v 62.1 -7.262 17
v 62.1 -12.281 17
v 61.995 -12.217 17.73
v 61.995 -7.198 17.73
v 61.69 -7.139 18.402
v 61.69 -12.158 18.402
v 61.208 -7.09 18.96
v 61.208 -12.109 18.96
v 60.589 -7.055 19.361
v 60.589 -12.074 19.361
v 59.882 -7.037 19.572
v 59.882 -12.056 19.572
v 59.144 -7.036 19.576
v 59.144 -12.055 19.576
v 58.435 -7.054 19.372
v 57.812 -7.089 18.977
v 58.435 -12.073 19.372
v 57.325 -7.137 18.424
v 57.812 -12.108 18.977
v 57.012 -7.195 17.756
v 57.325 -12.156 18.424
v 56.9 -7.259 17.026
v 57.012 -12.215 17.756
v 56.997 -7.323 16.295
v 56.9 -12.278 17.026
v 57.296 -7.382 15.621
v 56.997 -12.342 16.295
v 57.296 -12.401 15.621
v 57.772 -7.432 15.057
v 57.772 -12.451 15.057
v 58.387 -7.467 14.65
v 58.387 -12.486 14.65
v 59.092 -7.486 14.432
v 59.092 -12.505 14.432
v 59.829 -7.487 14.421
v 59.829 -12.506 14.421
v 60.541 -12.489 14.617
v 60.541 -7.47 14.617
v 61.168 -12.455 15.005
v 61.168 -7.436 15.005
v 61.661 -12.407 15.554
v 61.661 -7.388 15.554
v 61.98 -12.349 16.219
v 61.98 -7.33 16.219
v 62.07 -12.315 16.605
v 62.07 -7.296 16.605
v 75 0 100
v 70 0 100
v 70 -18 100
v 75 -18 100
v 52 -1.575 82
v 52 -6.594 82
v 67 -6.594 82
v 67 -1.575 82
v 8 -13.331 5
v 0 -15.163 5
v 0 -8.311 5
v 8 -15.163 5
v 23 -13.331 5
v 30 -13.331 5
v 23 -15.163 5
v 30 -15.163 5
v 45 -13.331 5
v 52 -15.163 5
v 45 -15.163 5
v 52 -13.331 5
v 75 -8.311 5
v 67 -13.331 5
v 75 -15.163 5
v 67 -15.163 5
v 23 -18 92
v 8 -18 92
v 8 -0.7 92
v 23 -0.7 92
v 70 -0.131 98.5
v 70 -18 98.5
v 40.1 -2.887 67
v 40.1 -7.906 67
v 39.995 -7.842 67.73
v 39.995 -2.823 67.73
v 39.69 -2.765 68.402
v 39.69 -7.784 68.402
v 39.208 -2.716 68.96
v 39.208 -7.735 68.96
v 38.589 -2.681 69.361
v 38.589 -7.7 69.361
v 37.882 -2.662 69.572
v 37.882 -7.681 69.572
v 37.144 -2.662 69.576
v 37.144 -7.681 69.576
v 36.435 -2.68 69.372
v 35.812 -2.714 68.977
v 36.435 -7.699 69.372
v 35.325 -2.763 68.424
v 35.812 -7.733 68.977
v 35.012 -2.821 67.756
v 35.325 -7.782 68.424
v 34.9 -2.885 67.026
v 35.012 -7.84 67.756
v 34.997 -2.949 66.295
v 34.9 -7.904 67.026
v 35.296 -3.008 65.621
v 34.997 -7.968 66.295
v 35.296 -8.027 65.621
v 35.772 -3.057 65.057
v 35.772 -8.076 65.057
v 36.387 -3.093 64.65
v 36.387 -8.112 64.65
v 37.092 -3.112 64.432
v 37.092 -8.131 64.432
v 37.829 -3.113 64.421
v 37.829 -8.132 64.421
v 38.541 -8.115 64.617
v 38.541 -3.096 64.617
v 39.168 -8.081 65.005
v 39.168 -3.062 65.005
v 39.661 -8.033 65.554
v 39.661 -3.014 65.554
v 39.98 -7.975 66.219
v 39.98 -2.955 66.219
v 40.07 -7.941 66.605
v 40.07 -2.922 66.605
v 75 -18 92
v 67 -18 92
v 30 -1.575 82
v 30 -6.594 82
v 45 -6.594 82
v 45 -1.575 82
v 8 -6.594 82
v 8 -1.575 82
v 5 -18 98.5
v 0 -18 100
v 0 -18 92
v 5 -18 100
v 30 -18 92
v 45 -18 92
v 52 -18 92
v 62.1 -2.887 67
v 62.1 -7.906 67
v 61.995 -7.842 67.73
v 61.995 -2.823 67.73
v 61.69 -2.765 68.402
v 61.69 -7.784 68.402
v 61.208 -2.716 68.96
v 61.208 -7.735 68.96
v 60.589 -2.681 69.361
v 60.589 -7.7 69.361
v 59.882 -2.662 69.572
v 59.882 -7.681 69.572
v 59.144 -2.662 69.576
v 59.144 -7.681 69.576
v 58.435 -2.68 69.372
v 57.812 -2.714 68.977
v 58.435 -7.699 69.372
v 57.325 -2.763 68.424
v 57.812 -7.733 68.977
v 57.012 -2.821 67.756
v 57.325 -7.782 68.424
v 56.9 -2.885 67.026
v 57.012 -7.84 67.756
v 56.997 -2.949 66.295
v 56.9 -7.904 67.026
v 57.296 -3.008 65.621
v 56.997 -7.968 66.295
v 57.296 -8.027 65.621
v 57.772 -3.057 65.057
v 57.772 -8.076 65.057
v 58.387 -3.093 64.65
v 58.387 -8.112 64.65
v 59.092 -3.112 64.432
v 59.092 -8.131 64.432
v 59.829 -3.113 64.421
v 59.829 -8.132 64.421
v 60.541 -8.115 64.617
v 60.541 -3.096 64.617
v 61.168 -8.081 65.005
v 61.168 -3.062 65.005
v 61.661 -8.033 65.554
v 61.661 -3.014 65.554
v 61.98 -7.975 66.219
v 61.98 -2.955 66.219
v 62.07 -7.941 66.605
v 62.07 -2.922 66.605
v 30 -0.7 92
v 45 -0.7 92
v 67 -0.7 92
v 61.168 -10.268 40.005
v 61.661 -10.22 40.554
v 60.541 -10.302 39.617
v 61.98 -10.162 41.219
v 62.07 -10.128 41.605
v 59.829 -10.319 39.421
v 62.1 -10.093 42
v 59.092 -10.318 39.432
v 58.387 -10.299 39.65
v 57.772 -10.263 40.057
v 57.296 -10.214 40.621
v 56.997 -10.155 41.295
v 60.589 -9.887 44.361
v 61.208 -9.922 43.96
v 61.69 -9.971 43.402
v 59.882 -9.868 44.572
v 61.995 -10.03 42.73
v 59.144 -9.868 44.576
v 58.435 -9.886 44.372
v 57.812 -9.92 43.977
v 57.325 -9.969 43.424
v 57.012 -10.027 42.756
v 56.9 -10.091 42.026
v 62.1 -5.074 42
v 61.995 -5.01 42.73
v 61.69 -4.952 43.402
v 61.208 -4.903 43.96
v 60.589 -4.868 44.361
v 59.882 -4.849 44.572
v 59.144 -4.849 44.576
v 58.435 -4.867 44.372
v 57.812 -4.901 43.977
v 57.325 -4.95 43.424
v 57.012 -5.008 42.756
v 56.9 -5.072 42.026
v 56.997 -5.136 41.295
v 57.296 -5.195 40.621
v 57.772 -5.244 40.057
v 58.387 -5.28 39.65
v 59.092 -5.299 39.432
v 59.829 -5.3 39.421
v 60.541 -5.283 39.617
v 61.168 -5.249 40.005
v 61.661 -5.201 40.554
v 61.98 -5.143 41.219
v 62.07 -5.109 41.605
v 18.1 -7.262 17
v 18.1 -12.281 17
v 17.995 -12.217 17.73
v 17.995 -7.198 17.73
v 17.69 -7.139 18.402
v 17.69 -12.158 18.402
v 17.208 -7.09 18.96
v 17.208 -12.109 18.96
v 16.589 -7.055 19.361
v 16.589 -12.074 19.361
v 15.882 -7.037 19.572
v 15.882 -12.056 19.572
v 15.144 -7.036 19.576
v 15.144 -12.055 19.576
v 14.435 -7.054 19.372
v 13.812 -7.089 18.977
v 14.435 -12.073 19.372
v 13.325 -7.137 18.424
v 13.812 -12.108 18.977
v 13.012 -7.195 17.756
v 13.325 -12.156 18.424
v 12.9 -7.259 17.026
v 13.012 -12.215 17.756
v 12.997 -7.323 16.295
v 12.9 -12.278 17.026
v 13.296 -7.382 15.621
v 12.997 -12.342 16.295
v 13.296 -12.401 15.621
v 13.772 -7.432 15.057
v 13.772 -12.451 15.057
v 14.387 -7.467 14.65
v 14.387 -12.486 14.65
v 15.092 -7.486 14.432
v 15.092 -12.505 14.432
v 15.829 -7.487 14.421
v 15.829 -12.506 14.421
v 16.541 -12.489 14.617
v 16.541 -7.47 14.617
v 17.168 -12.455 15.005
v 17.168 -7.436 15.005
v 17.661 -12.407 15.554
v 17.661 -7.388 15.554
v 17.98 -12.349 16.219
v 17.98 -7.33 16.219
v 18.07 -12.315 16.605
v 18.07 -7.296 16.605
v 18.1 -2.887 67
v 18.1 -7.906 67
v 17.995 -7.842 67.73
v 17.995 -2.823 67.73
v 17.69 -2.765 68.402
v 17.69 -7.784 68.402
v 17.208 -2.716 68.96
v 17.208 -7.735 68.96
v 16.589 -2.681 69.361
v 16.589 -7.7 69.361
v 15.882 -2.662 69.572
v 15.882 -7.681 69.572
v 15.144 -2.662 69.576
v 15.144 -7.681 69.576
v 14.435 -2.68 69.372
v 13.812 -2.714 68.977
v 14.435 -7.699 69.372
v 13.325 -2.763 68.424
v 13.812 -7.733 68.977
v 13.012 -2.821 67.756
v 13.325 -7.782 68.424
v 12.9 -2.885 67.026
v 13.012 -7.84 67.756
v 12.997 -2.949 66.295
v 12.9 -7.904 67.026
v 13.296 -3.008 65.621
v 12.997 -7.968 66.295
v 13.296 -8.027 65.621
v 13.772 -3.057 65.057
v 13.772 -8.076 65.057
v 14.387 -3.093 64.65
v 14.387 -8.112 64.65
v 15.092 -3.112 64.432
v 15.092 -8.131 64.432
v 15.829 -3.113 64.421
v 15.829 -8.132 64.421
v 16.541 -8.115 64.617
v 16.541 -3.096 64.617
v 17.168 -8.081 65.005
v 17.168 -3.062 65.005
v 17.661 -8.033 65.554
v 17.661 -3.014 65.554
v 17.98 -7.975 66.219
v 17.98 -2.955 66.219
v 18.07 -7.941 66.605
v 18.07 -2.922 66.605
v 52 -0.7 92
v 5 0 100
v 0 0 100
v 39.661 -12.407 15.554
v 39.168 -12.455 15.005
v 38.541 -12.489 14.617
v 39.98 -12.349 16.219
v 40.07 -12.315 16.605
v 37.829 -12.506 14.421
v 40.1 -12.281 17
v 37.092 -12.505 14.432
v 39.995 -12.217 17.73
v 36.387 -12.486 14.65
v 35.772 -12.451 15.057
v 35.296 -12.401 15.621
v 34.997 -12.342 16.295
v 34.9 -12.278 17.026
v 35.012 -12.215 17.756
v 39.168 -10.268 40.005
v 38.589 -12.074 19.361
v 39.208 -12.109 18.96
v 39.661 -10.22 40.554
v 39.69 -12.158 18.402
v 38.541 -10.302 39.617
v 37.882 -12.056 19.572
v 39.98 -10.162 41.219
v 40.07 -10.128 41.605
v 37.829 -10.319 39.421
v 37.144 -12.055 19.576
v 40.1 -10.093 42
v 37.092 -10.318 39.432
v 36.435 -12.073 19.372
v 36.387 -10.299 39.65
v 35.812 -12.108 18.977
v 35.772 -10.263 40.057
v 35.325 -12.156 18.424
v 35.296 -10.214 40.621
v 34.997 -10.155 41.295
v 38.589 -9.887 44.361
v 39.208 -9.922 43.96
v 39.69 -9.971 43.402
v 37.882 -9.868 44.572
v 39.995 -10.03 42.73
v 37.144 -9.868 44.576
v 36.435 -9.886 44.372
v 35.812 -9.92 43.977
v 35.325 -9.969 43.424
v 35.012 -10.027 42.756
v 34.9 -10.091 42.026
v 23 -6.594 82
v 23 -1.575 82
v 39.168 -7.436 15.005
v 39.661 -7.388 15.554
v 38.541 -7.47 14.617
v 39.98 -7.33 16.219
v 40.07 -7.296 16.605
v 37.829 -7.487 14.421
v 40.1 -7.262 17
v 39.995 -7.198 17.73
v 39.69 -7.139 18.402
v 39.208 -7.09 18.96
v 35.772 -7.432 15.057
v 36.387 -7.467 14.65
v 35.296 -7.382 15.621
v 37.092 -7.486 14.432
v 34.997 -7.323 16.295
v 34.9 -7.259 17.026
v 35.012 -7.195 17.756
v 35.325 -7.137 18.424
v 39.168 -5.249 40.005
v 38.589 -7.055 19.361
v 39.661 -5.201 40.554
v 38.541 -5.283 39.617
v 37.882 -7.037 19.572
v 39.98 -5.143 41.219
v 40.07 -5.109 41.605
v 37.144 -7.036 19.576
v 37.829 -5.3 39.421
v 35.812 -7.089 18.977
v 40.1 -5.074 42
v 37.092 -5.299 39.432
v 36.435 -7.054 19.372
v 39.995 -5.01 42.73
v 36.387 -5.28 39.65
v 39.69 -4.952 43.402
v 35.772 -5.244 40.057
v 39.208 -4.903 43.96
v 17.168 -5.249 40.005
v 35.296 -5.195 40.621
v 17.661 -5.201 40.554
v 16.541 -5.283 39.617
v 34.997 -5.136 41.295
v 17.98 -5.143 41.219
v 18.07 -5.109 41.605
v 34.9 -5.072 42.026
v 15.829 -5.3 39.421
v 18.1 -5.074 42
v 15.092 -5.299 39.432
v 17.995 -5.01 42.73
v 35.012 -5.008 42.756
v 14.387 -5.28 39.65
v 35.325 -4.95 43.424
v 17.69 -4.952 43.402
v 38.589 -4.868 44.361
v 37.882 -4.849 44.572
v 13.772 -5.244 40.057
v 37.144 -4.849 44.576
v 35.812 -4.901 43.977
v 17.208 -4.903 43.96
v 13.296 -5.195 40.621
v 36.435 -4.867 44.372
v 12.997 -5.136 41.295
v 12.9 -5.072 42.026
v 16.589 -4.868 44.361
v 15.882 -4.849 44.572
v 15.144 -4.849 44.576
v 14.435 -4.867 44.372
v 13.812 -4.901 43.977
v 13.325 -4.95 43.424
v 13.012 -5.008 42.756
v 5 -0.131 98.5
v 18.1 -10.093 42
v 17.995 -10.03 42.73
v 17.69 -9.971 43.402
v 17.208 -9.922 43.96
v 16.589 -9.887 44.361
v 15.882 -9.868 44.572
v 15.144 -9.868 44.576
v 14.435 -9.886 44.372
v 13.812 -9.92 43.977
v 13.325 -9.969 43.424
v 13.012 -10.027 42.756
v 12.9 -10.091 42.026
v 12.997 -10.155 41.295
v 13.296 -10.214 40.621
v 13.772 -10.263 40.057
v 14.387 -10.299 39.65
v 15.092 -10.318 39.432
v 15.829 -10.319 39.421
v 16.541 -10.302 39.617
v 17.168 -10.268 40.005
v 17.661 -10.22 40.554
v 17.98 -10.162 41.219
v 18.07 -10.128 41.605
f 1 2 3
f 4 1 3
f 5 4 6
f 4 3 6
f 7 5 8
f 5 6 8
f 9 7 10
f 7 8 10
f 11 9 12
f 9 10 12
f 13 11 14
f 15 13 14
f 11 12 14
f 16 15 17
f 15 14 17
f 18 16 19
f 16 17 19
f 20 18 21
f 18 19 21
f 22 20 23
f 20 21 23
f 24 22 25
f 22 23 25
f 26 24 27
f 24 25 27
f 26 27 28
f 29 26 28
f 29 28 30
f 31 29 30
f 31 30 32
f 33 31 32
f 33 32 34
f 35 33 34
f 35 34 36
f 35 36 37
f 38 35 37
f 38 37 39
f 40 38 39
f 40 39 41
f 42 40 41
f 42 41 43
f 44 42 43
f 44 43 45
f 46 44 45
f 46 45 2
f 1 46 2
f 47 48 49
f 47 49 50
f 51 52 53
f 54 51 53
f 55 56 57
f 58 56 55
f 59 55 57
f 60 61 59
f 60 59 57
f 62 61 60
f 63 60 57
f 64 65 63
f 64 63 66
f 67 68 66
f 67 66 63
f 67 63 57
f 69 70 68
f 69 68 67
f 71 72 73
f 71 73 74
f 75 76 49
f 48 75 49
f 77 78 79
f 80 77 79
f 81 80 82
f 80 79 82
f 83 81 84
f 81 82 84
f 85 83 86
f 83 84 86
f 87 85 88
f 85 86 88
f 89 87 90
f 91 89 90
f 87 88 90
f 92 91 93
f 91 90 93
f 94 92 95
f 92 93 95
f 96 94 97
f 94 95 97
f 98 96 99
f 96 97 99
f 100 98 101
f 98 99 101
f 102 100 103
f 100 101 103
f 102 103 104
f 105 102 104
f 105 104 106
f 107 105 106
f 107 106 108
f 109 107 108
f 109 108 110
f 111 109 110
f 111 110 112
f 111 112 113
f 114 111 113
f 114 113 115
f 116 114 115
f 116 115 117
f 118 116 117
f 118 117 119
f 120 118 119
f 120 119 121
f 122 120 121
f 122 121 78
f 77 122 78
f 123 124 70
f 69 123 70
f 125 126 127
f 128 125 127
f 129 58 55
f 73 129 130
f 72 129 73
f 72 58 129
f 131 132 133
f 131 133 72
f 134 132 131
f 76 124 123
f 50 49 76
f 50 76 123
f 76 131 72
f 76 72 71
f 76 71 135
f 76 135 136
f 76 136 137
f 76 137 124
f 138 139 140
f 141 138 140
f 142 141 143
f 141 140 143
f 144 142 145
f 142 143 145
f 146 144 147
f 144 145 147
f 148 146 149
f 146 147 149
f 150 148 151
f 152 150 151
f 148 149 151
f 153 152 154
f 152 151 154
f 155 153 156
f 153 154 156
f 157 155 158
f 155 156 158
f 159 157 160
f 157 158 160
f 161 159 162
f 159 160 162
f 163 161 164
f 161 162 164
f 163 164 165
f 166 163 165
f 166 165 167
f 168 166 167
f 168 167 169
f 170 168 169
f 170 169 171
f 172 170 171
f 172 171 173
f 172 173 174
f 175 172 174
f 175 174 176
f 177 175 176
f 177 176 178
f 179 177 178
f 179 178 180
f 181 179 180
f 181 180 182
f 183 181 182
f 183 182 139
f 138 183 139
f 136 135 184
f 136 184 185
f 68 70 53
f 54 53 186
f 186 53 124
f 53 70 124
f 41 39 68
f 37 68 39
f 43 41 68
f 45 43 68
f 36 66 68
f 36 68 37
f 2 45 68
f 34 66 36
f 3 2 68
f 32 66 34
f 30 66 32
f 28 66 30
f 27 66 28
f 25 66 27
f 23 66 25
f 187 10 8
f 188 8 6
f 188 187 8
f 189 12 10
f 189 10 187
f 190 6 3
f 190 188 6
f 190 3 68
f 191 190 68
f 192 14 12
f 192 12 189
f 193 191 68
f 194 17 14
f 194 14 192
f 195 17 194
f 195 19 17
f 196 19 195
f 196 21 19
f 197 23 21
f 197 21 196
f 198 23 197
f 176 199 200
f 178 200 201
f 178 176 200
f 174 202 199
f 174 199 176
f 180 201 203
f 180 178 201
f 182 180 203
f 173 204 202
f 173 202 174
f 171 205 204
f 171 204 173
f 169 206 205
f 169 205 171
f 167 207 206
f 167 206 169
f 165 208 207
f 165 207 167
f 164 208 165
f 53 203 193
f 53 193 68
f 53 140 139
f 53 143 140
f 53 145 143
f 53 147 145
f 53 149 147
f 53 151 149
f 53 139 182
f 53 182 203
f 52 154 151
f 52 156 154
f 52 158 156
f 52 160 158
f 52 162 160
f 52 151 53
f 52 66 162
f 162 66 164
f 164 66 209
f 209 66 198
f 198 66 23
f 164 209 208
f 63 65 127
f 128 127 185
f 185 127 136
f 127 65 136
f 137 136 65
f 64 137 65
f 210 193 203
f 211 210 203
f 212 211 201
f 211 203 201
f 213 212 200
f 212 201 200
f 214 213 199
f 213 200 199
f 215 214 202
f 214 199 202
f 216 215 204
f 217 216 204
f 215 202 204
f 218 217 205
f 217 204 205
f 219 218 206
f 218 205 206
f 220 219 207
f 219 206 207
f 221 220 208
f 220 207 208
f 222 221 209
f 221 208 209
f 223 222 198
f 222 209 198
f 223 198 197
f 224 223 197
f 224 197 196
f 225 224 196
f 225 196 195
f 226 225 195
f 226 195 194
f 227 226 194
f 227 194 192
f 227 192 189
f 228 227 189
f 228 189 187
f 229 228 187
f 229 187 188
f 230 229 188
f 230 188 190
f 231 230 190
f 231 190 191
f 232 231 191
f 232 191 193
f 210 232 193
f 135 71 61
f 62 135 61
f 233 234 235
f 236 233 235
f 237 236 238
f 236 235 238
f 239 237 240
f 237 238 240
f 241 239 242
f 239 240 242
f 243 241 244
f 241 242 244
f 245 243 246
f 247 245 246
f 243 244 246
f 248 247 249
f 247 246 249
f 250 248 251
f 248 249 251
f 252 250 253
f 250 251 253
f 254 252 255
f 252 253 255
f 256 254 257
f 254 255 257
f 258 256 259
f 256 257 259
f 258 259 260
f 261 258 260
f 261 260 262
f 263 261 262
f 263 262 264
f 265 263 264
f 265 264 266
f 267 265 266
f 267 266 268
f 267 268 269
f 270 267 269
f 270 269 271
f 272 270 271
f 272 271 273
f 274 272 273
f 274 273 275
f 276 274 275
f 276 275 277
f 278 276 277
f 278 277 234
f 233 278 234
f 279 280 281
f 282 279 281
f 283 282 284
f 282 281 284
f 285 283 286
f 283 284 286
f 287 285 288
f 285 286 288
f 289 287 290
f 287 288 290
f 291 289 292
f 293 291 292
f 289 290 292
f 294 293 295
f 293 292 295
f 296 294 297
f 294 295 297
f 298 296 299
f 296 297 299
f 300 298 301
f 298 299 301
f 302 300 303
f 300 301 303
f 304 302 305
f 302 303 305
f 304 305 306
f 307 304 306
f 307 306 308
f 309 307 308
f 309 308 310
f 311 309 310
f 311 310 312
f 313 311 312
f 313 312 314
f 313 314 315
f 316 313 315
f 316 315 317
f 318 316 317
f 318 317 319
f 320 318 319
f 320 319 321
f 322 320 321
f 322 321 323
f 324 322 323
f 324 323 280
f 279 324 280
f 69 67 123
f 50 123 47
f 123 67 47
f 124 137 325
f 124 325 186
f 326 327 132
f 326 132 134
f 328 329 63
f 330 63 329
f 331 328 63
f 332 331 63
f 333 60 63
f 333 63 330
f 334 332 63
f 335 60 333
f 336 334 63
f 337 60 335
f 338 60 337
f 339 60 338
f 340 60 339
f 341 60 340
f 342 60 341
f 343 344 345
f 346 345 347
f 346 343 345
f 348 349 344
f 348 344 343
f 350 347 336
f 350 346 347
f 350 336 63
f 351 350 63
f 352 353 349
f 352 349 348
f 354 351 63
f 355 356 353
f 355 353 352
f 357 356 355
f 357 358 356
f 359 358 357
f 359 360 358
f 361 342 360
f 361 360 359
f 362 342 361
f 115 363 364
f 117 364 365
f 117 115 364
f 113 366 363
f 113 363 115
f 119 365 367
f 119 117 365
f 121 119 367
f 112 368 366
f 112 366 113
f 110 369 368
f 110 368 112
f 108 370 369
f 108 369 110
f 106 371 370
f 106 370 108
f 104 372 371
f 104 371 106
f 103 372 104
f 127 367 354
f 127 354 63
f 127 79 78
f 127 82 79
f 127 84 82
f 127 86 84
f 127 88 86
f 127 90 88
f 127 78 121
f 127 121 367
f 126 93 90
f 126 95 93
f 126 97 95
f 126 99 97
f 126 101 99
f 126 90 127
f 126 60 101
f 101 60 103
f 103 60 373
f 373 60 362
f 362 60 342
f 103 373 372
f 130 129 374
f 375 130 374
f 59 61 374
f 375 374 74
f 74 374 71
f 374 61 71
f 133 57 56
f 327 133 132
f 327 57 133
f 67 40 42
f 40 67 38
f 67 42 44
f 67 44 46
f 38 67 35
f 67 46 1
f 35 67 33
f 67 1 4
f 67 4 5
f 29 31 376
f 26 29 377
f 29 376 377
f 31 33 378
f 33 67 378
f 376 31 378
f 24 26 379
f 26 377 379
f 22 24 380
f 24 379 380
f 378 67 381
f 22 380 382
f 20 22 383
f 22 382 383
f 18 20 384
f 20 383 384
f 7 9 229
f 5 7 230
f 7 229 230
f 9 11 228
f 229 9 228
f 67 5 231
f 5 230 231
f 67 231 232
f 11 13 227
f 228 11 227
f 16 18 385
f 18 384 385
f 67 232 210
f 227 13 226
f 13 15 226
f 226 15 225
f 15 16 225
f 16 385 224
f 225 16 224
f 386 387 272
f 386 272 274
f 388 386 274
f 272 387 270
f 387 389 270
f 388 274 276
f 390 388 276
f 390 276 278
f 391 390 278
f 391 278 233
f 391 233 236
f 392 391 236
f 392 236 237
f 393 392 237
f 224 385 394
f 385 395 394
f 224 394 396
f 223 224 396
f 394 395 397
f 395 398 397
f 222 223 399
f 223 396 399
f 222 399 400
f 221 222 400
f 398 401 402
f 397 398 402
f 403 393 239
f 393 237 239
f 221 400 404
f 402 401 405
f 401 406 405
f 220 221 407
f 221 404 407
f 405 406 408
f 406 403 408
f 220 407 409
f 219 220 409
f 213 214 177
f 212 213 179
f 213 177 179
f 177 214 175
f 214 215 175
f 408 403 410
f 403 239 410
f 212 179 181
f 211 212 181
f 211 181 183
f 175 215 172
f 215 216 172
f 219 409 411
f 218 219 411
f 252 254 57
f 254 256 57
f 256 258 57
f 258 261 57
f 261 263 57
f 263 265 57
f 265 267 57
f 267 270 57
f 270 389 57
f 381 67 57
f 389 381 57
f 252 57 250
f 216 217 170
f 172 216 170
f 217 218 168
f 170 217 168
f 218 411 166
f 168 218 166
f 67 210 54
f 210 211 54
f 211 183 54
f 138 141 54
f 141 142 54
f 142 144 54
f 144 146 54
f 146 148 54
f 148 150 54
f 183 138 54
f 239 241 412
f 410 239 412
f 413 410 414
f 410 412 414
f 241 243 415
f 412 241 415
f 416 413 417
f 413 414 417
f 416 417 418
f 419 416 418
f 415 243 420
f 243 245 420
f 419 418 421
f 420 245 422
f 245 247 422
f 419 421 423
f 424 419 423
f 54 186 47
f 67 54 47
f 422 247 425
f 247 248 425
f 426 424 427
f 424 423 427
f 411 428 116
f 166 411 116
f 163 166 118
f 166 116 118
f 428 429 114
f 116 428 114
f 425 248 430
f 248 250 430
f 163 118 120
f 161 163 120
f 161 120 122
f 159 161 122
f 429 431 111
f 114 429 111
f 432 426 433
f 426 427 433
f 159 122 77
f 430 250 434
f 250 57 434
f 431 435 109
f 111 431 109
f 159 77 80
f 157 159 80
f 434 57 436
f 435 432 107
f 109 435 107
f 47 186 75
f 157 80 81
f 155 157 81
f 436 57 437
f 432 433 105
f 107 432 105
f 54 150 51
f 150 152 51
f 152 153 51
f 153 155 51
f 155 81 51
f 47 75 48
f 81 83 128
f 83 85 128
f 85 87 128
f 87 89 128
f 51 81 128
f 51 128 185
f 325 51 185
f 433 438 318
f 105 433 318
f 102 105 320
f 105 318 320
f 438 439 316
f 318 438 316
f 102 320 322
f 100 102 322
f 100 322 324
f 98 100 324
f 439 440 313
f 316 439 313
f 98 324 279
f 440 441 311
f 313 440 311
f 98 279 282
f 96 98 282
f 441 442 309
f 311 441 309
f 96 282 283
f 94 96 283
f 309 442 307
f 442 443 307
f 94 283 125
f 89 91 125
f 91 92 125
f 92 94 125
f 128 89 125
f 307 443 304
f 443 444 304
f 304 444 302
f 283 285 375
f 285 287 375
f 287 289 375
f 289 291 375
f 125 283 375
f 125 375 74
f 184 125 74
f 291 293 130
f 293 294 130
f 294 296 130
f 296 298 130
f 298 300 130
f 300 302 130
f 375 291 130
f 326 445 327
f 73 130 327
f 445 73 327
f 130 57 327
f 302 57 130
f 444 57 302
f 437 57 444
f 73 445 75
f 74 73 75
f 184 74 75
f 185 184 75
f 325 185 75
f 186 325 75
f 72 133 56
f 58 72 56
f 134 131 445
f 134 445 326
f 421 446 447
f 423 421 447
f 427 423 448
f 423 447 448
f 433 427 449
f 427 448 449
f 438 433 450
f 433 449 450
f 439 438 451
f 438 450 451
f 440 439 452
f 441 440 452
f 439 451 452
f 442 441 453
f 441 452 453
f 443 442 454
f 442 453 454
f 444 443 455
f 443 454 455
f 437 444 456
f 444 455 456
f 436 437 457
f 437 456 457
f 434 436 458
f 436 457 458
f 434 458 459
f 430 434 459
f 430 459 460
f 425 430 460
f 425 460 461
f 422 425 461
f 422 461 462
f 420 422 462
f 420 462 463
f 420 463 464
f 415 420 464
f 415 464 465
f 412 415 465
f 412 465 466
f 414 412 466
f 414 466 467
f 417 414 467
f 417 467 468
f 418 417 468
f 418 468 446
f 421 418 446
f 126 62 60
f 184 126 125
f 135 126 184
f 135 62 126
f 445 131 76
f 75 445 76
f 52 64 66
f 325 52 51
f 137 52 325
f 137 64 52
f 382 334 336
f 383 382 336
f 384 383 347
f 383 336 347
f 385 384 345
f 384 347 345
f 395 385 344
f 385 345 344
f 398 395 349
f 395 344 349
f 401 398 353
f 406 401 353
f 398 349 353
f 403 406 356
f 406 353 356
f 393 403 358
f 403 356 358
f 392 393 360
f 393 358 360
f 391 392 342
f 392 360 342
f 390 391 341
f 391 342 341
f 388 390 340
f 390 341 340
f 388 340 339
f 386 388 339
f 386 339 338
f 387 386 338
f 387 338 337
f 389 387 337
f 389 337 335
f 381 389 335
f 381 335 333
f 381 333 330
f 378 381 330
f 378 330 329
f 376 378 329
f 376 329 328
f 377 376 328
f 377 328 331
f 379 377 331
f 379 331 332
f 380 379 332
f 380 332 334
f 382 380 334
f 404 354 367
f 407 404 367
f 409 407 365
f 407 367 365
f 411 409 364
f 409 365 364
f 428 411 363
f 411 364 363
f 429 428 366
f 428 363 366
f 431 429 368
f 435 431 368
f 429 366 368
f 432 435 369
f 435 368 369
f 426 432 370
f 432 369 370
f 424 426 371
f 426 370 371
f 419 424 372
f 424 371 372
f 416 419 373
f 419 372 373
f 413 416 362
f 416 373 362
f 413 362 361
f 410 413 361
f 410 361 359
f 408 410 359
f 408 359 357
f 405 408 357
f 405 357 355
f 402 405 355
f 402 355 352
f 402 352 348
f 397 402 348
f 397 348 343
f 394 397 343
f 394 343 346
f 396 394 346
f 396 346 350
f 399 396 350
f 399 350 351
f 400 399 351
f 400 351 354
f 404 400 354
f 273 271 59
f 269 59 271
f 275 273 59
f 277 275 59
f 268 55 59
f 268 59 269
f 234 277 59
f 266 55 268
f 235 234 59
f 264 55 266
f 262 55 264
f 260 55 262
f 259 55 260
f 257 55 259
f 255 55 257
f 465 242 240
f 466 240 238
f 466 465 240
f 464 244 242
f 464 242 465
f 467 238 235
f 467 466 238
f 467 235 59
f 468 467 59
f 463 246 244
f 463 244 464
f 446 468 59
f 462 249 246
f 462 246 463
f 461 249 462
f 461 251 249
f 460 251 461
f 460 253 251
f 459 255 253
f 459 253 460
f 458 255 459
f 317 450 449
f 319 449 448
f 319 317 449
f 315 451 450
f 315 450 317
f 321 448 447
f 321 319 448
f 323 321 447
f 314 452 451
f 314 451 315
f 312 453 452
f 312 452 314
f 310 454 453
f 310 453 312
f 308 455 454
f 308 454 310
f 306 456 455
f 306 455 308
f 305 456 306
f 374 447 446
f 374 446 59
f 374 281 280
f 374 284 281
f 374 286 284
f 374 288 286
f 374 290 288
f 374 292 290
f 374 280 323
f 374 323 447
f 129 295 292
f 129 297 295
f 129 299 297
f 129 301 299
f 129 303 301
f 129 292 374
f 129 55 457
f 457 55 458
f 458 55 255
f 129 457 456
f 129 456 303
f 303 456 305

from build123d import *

# Parameters (mm, degrees)
F0_W      = 75
F0_H      = 100
F1_DEPTH  = 18
F3_DEPTH  = 75.001
F4_W      = 15
F4_H      = 92
F5_DEPTH  = 50
F6_W      = 65
F6_H      = 18
F7_DEPTH  = 1.5
F9_DEPTH  = 75.001
F11_DEPTH = 75
F12_W     = 65
F12_H     = 1.5
F13_DEPTH = 18.001
F14_W     = 15
F14_H     = 10
F14_W_2   = 75.273126
F14_H_2   = 5
F14_R     = 2.6
F15_DEPTH = 18.001


with BuildPart() as f1:
    # F0 (on Front) → F1 (new body)
    with BuildSketch(Plane.XZ):
        with Locations((37.5, 50)):
            Rectangle(F0_W, F0_H)
    extrude(amount=F1_DEPTH)

    # F2 (on face) → F3 (cut, through all)
    with BuildSketch(Plane(origin=(0, 0, 0), x_dir=(0, -1, 0), z_dir=(-1, 0, 0))):
        Polygon((18, 92), (15, 0), (18, 0), align=None)
    extrude(amount=-F3_DEPTH, mode=Mode.SUBTRACT)

    # F4 (on face) → F5 (cut)
    with BuildSketch(Plane.XZ.offset(18)):
        with Locations((15.5, 46)):
            Rectangle(F4_W, F4_H)
        with Locations((37.5, 46)):
            Rectangle(F4_W, F4_H)
        with Locations((59.5, 46)):
            Rectangle(F4_W, F4_H)
    extrude(amount=-F5_DEPTH, mode=Mode.SUBTRACT)

    # F6 (on face) → F7 (cut)
    with BuildSketch(Plane.XY.offset(100)):
        with Locations((37.5, -9)):
            Rectangle(F6_W, F6_H)
    extrude(amount=-F7_DEPTH, mode=Mode.SUBTRACT)

    # F8 (on face) → F9 (cut, through all)
    with BuildSketch(Plane(origin=(0, 0, 0), x_dir=(0, -1, 0), z_dir=(-1, 0, 0))):
        Polygon((8.748866, 0), (0, 100), (0, 0), align=None)
    extrude(amount=-F9_DEPTH, mode=Mode.SUBTRACT)

    # F10 (on face) → F11 (join, through all)
    with BuildSketch(Plane(origin=(0, 0, 0), x_dir=(0, -1, 0), z_dir=(-1, 0, 0))):
        Polygon((5.019099, 100), (0, 100), (8.748866, 0), (13.767966, 0), align=None)
    extrude(amount=-F11_DEPTH)

    # F12 (on face) → F13 (cut, through all)
    with BuildSketch(Plane.XZ.offset(18)):
        with Locations((37.5, 99.25)):
            Rectangle(F12_W, F12_H)
    extrude(amount=-F13_DEPTH, mode=Mode.SUBTRACT)

    # F14 (on face) → F15 (cut, through all)
    with BuildSketch(Plane.XZ.offset(18)):
        with Locations((15.5, 87)):
            Rectangle(F14_W, F14_H)
        with Locations((37.5, 87)):
            Rectangle(F14_W, F14_H)
        with Locations((59.5, 87)):
            Rectangle(F14_W, F14_H)
        with Locations((37.636563, 2.5)):
            Rectangle(F14_W_2, F14_H_2)
        with Locations((15.5, 67)):
            Circle(F14_R)
        with Locations((37.5, 67)):
            Circle(F14_R)
        with Locations((59.5, 67)):
            Circle(F14_R)
        with Locations((59.5, 42)):
            Circle(F14_R)
        with Locations((37.5, 42)):
            Circle(F14_R)
        with Locations((37.5, 17)):
            Circle(F14_R)
        with Locations((59.5, 17)):
            Circle(F14_R)
        with Locations((15.5, 17)):
            Circle(F14_R)
        with Locations((15.5, 42)):
            Circle(F14_R)
    extrude(amount=-F15_DEPTH, mode=Mode.SUBTRACT)


solid = f1.part
